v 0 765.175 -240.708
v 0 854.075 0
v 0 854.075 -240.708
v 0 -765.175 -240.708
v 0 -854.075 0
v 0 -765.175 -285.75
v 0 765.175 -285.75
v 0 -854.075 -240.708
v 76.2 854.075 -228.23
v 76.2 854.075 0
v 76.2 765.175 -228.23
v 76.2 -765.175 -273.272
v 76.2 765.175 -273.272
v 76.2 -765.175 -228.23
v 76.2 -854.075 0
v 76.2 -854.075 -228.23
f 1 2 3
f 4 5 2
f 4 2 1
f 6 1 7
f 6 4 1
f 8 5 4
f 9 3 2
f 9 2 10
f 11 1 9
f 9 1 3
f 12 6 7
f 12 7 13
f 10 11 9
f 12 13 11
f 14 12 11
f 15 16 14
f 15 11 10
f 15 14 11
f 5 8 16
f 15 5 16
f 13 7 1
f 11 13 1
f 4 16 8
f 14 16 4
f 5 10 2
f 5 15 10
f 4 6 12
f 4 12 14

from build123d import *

# Parameters (mm, degrees)
F1_DEPTH = 854.075
F3_W     = 88.9
F3_H     = 44.45
F4_DEPTH = 127


with BuildPart() as f1:
    # F0 (on Front) → F1 (new body, symmetric)
    with BuildSketch(Plane.XZ):
        Polygon((76.2, 0), (0, 0), (0, -285.75), (76.2, -273.2717714572), align=None)
    extrude(amount=F1_DEPTH, both=True)

    # F3 (on face) → F4 (cut, symmetric)
    with BuildSketch(Plane(origin=(-45.571311316, 0, -7.4625884199), x_dir=(0, 1, 0), z_dir=(0.9868557164, 0, 0.1616038211))):
        with Locations((809.625, -259.7690209632)):
            Rectangle(F3_W, F3_H)
        with Locations((-809.625, -259.7690209632)):
            Rectangle(F3_W, F3_H)
    extrude(amount=F4_DEPTH, both=True, mode=Mode.SUBTRACT)


solid = f1.part
